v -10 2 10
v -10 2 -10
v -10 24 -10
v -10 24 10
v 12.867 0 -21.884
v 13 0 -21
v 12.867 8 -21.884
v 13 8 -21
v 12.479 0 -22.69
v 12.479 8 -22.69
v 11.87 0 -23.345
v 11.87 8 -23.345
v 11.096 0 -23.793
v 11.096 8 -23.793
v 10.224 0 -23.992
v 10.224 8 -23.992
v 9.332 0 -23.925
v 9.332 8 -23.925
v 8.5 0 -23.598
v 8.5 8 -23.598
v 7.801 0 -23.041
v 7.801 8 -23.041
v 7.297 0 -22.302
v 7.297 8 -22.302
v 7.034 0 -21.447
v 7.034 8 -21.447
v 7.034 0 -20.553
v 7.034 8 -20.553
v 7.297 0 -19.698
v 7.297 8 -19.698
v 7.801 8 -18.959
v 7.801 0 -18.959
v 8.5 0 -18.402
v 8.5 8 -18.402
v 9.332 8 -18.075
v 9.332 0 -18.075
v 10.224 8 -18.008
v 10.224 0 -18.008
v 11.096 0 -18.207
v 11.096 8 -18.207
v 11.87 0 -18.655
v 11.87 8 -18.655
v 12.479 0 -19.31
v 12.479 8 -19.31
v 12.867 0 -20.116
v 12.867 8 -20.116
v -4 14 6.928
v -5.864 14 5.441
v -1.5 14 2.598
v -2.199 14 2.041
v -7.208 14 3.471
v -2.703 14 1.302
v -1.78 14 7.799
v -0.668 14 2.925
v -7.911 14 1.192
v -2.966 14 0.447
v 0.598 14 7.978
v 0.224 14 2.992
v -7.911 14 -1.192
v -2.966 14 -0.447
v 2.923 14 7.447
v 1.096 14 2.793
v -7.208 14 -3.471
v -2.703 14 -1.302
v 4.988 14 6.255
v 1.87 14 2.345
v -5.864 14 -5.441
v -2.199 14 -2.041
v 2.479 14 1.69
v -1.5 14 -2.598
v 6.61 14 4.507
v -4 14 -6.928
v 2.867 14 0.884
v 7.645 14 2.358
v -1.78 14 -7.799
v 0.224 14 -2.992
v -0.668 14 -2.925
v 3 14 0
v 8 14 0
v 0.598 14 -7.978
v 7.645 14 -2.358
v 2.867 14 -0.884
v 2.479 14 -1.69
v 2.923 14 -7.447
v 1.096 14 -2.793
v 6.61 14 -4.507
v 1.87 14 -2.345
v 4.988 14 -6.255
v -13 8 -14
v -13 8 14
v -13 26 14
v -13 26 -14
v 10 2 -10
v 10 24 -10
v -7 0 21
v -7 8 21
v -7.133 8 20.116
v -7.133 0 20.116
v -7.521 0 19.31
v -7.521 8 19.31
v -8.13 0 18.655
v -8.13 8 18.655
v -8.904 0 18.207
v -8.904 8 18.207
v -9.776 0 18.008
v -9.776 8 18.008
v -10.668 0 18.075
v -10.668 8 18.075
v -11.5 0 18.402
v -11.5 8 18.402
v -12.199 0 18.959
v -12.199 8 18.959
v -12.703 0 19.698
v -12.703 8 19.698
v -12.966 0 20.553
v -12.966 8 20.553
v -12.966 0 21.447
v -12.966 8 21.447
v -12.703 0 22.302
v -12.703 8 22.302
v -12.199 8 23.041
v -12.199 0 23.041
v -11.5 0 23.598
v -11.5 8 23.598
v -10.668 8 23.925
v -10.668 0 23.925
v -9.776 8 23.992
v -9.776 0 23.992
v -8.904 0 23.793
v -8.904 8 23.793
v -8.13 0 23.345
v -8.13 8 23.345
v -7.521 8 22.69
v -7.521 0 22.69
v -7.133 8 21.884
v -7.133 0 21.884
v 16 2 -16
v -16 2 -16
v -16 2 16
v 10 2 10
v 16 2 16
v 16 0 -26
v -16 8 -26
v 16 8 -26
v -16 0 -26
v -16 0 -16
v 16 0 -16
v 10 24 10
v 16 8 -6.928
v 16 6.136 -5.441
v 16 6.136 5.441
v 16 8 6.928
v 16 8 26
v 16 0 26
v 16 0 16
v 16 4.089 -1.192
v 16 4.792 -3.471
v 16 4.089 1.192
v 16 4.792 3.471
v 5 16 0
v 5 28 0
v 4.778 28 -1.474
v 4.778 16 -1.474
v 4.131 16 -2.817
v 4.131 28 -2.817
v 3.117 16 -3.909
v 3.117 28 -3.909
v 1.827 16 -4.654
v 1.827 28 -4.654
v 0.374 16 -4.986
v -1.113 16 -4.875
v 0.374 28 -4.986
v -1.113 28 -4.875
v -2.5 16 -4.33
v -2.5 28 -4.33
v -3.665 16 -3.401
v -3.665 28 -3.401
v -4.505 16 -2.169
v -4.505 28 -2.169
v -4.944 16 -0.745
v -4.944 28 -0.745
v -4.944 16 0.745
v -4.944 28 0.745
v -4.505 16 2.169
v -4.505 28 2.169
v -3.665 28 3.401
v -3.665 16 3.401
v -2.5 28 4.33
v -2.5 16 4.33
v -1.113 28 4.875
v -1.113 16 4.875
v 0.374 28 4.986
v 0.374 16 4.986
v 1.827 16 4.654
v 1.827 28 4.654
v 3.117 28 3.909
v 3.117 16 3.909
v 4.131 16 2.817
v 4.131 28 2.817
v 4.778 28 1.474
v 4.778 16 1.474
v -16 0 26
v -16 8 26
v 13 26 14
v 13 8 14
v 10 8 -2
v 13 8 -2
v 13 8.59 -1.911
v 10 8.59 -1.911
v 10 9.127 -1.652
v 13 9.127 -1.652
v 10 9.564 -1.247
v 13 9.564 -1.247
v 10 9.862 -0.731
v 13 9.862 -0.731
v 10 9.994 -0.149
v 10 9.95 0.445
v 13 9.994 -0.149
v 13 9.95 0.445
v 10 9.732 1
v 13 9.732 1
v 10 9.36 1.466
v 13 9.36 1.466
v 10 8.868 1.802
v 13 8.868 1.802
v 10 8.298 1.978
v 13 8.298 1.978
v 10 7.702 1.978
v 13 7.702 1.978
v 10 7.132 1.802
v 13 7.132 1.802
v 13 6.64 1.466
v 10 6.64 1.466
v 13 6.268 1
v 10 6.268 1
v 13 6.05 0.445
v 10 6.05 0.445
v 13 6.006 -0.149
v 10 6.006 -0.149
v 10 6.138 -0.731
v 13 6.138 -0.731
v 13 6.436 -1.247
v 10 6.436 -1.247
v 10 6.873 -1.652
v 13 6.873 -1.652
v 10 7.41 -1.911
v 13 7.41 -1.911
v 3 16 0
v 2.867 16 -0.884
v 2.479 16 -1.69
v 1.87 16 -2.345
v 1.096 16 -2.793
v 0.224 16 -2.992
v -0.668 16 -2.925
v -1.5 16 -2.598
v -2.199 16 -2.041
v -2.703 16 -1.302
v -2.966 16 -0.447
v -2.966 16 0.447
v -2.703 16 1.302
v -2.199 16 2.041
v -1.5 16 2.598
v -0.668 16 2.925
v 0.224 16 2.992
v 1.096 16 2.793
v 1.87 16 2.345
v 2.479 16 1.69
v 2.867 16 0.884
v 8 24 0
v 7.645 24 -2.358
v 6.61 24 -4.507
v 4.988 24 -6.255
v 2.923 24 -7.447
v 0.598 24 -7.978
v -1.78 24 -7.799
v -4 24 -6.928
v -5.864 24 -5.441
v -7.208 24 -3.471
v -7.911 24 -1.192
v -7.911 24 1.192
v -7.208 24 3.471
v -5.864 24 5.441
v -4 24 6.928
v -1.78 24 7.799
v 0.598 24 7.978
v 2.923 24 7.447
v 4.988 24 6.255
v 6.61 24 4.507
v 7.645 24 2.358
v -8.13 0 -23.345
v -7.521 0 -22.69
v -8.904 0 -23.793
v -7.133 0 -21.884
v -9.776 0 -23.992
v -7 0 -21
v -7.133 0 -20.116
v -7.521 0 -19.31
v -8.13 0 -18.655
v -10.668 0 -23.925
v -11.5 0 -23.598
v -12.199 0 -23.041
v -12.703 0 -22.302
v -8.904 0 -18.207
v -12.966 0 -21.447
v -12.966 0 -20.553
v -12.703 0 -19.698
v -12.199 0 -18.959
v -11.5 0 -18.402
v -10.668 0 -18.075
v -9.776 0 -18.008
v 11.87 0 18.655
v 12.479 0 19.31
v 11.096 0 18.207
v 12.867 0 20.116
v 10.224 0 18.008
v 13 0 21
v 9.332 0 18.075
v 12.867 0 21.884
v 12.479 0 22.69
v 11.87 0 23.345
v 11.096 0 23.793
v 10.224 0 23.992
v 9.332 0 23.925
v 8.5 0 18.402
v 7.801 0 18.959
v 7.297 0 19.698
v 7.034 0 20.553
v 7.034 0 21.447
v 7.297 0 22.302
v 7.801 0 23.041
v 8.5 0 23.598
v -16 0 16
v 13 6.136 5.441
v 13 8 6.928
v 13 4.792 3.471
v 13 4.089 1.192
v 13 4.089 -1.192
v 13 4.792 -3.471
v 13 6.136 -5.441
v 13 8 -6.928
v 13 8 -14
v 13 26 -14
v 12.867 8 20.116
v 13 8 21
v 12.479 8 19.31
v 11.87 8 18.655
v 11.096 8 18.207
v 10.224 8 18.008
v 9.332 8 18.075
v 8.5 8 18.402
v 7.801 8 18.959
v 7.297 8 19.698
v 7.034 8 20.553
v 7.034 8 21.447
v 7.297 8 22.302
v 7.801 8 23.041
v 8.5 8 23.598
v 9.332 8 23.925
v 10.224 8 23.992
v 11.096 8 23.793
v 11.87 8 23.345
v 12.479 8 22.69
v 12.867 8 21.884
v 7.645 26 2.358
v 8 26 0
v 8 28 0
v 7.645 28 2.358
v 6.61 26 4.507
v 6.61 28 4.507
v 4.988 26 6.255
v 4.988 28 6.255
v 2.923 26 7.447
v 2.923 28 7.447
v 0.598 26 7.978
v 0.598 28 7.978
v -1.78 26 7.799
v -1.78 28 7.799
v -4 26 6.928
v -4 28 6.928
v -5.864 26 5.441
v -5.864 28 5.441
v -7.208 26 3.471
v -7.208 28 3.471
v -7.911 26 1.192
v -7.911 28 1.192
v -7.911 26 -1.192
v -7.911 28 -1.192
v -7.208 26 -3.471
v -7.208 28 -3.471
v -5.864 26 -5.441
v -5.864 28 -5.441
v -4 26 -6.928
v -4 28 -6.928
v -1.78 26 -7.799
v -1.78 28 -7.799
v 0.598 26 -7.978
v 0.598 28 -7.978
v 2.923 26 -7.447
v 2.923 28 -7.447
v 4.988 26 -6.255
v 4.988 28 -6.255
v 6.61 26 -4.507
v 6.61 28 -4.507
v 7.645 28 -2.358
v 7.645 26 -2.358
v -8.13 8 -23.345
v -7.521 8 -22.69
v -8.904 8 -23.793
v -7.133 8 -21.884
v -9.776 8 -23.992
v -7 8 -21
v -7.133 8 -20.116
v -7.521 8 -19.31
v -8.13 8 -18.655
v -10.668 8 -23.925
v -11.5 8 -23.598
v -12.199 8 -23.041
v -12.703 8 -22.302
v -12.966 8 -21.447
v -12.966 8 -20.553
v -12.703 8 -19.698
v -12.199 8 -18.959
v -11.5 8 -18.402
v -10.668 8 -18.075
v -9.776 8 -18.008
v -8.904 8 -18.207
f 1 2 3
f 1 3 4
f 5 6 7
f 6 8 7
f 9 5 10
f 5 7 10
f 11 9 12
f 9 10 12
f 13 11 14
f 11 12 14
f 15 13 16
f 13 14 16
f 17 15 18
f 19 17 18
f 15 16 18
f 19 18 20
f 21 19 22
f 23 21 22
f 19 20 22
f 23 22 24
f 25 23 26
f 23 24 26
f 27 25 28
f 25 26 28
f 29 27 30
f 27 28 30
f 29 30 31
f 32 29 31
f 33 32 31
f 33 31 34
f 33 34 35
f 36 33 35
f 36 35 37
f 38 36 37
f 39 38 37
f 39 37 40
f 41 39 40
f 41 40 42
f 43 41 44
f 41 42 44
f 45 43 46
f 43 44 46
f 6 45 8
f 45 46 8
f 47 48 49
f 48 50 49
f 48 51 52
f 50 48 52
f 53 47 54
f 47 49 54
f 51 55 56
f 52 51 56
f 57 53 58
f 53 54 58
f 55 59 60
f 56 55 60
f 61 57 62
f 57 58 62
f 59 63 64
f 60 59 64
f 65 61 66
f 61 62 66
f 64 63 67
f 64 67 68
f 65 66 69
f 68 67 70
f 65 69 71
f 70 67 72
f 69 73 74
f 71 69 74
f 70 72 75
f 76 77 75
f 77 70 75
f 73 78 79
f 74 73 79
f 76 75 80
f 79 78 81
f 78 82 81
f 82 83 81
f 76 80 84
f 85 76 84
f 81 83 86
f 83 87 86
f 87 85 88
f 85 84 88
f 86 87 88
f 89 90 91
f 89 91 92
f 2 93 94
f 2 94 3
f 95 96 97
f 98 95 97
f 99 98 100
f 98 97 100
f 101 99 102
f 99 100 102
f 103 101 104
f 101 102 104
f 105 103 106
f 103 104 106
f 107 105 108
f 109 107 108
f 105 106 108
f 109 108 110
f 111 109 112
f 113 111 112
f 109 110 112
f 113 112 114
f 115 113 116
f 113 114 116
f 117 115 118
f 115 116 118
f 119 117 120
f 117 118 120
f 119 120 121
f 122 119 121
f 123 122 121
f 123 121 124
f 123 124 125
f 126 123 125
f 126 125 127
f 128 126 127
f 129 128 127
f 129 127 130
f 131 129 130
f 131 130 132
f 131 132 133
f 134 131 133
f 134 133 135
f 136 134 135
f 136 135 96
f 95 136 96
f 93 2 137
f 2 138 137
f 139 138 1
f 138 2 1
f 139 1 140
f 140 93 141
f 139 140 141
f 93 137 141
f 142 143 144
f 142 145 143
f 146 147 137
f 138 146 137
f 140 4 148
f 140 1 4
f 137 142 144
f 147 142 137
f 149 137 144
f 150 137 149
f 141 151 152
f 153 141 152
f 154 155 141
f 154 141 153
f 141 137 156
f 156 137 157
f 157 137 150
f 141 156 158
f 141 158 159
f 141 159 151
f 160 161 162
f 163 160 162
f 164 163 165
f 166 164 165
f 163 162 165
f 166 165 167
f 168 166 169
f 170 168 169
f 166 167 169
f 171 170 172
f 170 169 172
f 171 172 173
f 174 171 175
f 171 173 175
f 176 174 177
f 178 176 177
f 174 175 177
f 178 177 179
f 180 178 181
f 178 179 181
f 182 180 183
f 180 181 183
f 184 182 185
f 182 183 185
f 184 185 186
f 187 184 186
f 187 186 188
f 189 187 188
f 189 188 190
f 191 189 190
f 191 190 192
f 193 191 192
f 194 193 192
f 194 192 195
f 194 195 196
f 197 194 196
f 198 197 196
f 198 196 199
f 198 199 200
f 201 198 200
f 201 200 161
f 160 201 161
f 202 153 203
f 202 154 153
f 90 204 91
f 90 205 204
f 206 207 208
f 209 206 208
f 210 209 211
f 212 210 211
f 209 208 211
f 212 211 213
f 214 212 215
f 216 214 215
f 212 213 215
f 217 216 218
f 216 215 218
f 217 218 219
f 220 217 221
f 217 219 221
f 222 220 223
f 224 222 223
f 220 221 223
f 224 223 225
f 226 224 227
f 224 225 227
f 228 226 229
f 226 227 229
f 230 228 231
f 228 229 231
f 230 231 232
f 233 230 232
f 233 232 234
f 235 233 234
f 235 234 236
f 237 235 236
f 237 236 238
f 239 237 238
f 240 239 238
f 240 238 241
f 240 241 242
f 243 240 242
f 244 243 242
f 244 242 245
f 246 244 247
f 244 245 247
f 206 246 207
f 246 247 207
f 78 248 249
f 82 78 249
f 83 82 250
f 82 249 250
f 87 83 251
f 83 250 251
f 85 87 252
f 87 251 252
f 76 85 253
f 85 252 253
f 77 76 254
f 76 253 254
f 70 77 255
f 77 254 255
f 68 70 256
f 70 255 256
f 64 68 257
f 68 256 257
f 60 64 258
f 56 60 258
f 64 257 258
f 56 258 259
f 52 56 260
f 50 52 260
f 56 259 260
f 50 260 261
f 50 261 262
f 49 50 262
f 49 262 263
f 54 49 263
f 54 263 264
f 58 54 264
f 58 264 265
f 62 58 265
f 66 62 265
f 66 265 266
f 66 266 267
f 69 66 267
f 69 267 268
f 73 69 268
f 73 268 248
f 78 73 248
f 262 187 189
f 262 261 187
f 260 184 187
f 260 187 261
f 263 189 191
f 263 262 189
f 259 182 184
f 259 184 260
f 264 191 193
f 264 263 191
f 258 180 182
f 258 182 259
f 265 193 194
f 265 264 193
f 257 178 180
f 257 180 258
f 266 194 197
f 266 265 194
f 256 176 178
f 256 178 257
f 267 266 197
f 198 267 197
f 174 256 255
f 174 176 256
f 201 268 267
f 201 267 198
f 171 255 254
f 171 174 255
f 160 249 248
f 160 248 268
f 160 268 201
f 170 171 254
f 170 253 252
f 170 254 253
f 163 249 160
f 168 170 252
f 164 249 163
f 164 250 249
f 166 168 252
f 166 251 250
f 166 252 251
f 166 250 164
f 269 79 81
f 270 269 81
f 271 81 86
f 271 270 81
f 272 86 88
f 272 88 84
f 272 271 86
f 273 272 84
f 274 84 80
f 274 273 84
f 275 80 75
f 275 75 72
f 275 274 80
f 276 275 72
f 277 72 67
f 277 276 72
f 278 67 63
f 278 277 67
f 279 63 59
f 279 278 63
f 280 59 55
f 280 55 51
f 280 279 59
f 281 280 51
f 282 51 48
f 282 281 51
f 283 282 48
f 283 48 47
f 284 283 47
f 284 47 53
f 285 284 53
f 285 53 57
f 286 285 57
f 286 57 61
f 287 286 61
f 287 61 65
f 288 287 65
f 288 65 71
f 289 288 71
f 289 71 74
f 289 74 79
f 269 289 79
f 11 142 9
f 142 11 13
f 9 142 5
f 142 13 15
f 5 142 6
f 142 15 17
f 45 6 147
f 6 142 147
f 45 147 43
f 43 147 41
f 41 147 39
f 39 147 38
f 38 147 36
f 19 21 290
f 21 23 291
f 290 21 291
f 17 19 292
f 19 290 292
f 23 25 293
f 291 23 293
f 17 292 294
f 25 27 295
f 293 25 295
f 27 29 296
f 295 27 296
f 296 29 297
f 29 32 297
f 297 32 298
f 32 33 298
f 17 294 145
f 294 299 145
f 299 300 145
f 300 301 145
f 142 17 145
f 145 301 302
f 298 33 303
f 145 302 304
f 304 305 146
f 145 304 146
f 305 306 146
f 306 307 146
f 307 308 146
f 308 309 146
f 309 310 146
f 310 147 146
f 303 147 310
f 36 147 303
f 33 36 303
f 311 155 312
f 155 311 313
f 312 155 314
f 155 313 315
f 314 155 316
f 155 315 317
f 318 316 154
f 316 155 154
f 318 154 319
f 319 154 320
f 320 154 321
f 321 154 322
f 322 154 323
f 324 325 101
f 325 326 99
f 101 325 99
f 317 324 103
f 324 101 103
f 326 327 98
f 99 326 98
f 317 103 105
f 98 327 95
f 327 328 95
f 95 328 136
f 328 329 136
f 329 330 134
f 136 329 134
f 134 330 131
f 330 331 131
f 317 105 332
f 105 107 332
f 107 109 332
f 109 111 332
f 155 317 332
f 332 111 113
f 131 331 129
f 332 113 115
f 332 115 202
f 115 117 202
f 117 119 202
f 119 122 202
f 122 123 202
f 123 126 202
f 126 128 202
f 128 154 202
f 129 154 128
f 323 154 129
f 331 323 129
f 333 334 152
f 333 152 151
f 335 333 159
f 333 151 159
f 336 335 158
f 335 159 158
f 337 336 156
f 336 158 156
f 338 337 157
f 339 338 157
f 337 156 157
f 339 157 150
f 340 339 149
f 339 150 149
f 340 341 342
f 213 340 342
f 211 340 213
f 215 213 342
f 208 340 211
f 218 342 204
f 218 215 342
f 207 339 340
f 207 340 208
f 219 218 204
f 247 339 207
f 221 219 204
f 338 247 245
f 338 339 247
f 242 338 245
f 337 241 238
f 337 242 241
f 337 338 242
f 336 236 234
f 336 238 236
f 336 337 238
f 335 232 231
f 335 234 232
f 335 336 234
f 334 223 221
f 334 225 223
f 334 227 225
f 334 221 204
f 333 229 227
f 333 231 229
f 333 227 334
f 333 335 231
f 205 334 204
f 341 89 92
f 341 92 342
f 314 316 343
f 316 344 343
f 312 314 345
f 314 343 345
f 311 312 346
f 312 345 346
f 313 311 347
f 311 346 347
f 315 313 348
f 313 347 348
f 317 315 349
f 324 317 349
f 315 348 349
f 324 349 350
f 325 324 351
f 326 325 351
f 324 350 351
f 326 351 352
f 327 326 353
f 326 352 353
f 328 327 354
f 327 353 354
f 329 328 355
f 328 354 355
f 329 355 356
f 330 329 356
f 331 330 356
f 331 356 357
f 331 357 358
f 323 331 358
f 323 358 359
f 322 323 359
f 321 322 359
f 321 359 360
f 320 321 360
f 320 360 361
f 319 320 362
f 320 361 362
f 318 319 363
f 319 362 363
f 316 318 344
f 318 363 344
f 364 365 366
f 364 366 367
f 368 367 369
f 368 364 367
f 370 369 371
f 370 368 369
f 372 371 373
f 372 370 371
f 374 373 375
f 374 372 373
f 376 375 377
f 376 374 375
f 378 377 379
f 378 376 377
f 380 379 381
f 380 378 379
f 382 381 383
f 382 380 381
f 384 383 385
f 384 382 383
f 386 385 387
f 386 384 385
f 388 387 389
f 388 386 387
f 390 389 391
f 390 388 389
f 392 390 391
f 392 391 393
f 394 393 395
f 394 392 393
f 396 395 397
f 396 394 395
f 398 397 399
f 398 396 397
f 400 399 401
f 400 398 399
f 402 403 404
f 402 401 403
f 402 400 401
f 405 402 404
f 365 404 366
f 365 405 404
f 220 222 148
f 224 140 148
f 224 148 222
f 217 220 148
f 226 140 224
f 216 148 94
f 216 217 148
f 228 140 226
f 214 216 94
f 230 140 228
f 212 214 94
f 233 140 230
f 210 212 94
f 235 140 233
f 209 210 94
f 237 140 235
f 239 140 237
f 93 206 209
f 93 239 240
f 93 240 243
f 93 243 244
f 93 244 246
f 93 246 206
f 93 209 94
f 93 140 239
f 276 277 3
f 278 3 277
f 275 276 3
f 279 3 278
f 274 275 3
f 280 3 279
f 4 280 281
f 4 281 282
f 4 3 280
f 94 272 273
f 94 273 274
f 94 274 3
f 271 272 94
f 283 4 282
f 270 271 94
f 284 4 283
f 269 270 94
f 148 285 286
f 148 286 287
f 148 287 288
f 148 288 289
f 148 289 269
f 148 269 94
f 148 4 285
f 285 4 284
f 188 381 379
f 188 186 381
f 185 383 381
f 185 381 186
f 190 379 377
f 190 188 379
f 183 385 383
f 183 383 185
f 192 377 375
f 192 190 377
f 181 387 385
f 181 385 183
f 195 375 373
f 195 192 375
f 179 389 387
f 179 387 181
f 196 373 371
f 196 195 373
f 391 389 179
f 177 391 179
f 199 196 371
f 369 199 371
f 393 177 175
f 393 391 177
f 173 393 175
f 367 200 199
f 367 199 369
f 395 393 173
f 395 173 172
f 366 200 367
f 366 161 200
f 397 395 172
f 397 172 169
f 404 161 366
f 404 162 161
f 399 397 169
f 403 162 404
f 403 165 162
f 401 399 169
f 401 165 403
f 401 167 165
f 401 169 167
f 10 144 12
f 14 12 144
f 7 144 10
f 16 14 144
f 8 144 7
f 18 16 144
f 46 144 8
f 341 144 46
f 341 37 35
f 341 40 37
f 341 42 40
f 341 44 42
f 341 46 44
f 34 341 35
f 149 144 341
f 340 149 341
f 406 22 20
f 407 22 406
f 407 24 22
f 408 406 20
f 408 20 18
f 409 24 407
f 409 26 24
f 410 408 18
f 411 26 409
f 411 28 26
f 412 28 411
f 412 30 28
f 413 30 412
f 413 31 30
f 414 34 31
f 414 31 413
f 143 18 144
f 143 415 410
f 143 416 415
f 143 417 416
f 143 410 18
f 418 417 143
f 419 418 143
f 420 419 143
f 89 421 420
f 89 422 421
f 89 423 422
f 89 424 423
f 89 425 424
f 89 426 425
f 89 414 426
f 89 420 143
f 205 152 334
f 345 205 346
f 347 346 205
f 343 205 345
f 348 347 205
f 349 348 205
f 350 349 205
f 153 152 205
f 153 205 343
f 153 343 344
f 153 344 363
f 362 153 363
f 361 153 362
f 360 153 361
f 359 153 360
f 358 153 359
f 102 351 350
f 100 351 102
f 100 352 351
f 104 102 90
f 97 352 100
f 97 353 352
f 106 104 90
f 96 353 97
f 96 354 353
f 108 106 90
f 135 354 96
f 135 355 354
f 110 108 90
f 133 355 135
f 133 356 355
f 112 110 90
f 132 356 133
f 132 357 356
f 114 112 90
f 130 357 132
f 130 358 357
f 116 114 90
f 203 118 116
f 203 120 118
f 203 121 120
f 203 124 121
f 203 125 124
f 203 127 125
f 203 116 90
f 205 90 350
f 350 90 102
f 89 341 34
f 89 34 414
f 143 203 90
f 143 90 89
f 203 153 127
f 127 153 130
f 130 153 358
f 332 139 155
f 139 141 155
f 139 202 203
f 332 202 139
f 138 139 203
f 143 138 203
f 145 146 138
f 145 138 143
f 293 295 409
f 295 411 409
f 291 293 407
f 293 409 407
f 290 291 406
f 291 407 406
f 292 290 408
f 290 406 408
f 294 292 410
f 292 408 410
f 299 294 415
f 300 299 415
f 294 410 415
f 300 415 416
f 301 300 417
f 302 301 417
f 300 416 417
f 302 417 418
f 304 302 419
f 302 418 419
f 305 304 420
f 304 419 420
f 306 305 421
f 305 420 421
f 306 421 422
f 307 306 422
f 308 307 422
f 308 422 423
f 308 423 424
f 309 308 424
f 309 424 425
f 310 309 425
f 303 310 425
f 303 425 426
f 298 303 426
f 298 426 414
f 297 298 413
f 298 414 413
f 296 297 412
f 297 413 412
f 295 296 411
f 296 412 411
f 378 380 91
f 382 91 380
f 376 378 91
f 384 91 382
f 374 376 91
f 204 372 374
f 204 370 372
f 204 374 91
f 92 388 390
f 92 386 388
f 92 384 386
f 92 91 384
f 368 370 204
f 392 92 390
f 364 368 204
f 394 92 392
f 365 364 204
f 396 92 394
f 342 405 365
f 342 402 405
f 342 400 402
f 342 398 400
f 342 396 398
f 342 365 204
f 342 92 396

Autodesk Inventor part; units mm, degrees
ref_plane "YZ Plane" through (0, 0, 0) normal (1, 0, 0) x (0, 1, 0)
ref_plane "XZ Plane" through (0, 0, 0) normal (0, 1, 0) x (-1, 0, 0)
ref_plane "XY Plane" through (0, 0, 0) normal (0, 0, 1) x (1, 0, 0)
sketch "草图1" plane through (0, 0, 0) normal (0, 1, 0) x (-1, 0, 0)
  line L0 (-16, 26) -> (16, 26)
  line L1 (16, 26) -> (16, -26)
  line L2 (16, -26) -> (-16, -26)
  line L3 (-16, -26) -> (-16, 26)
  line L4 (-16, 26) -> (16, -26) construction
  line L5 (16, 26) -> (-16, -26) construction
  point P0 (0, 0)
  dimension "d0" = 52
  dimension "d1" = 32
extrude "拉伸1" add sketch "草图1" along normal blind 8
sketch "草图2" plane through (0, 8, 0) normal (0, 1, 0) x (1, 0, 0)
  line L0 (13, -14) -> (-13, -14)
  line L1 (-13, -14) -> (-13, 14)
  line L2 (-13, 14) -> (13, 14)
  line L3 (13, 14) -> (13, -14)
  line L4 (13, -14) -> (-13, 14) construction
  line L5 (-13, -14) -> (13, 14) construction
  point P0 (0, 0)
  dimension "d4" = 28
  dimension "d5" = 26
extrude "拉伸2" add sketch "草图2" along normal blind 18
sketch "草图3" plane through (16, 0, 26) normal (1, 0, 0) x (0, 0, -1)
  line L0 (10, -2) -> (42, -2)
  line L1 (42, -2) -> (42, 2)
  line L2 (42, 2) -> (10, 2)
  line L3 (10, 2) -> (10, -2)
  line L4 (10, -2) -> (42, 2) construction
  line L5 (42, -2) -> (10, 2) construction
  line L6 (52, 0) -> (0, 0) projected
  point P0 (26, 0)
  dimension "d8" = 2
  dimension "d9" = 32
extrude "拉伸3" cut sketch "草图3" against normal through all
sketch "草图4" plane through (16, 0, -26) normal (1, 0, 0) x (0, 0, -1)
  line L0 (-40, 26) -> (-12, 26) construction
  line L1 (-26, 26) -> (-26, 12) construction
  circle A0 centre (-26, 12) radius 8
  point P0 (-26, 0)
  dimension "d12" = 14
  dimension "d13" = 16
extrude "拉伸4" cut sketch "草图4" against normal up to surface (3 mm away)
sketch "草图5" plane through (0, 8, 0) normal (0, 1, 0) x (1, 0, 0)
  line L0 (10, -21) -> (-10, -21) construction
  line L1 (-10, -21) -> (-10, 21) construction
  line L2 (-10, 21) -> (10, 21) construction
  line L3 (10, 21) -> (10, -21) construction
  line L4 (10, -21) -> (-10, 21) construction
  line L5 (-10, -21) -> (10, 21) construction
  circle A0 centre (-10, -21) radius 3
  circle A1 centre (-10, 21) radius 3
  circle A2 centre (10, 21) radius 3
  circle A3 centre (10, -21) radius 3
  line L6 (16, -26) -> (-16, -26) projected
  point P0 (0, 0)
  dimension "d16" = 6
  dimension "d18" = 20
  dimension "d19" = 5
extrude "拉伸5" cut sketch "草图5" against normal blind 18
sketch "草图6" plane through (0, 0, 0) normal (0, -1, 0) x (1, 0, 0)
  line L0 (-10, 10) -> (10, 10)
  line L1 (10, 10) -> (10, -10)
  line L2 (10, -10) -> (-10, -10)
  line L3 (-10, -10) -> (-10, 10)
  line L4 (-10, 10) -> (10, -10) construction
  line L5 (10, 10) -> (-10, -10) construction
  point P0 (0, 0)
  dimension "d22" = 20
  dimension "d23" = 20
extrude "拉伸6" cut sketch "草图6" against normal blind 24
sketch "草图7" plane through (13, 8, -14) normal (1, 0, 0) x (0, 0, -1)
  line L0 (0, 18) -> (-28, 18) construction
  line L1 (-14, 18) -> (-14, 0) construction
  circle A0 centre (-14, 0) radius 2
  point P0 (-14, -8)
  dimension "d26" = 18
  dimension "d27" = 4
extrude "拉伸7" cut sketch "草图7" against normal up to surface (3 mm away)
sketch "草图8" plane through (0, 26, 0) normal (0, 1, 0) x (1, 0, 0)
  circle A0 centre (0, 0) radius 8
  dimension "d30" = 16
extrude "拉伸8" add sketch "草图8" along normal blind 2 and the other way blind 12
sketch "草图9" plane through (0, 28, 0) normal (0, 1, 0) x (1, 0, 0)
  circle A0 centre (0, 0) radius 5
  dimension "d35" = 10
extrude "拉伸9" cut sketch "草图9" against normal blind 12
sketch "草图10" plane through (0, 16, 0) normal (0, 1, 0) x (1, 0, 0)
  circle A0 centre (0, 0) radius 3
  dimension "d38" = 6
extrude "拉伸10" cut sketch "草图10" against normal blind 12
properties part number "模型3"
